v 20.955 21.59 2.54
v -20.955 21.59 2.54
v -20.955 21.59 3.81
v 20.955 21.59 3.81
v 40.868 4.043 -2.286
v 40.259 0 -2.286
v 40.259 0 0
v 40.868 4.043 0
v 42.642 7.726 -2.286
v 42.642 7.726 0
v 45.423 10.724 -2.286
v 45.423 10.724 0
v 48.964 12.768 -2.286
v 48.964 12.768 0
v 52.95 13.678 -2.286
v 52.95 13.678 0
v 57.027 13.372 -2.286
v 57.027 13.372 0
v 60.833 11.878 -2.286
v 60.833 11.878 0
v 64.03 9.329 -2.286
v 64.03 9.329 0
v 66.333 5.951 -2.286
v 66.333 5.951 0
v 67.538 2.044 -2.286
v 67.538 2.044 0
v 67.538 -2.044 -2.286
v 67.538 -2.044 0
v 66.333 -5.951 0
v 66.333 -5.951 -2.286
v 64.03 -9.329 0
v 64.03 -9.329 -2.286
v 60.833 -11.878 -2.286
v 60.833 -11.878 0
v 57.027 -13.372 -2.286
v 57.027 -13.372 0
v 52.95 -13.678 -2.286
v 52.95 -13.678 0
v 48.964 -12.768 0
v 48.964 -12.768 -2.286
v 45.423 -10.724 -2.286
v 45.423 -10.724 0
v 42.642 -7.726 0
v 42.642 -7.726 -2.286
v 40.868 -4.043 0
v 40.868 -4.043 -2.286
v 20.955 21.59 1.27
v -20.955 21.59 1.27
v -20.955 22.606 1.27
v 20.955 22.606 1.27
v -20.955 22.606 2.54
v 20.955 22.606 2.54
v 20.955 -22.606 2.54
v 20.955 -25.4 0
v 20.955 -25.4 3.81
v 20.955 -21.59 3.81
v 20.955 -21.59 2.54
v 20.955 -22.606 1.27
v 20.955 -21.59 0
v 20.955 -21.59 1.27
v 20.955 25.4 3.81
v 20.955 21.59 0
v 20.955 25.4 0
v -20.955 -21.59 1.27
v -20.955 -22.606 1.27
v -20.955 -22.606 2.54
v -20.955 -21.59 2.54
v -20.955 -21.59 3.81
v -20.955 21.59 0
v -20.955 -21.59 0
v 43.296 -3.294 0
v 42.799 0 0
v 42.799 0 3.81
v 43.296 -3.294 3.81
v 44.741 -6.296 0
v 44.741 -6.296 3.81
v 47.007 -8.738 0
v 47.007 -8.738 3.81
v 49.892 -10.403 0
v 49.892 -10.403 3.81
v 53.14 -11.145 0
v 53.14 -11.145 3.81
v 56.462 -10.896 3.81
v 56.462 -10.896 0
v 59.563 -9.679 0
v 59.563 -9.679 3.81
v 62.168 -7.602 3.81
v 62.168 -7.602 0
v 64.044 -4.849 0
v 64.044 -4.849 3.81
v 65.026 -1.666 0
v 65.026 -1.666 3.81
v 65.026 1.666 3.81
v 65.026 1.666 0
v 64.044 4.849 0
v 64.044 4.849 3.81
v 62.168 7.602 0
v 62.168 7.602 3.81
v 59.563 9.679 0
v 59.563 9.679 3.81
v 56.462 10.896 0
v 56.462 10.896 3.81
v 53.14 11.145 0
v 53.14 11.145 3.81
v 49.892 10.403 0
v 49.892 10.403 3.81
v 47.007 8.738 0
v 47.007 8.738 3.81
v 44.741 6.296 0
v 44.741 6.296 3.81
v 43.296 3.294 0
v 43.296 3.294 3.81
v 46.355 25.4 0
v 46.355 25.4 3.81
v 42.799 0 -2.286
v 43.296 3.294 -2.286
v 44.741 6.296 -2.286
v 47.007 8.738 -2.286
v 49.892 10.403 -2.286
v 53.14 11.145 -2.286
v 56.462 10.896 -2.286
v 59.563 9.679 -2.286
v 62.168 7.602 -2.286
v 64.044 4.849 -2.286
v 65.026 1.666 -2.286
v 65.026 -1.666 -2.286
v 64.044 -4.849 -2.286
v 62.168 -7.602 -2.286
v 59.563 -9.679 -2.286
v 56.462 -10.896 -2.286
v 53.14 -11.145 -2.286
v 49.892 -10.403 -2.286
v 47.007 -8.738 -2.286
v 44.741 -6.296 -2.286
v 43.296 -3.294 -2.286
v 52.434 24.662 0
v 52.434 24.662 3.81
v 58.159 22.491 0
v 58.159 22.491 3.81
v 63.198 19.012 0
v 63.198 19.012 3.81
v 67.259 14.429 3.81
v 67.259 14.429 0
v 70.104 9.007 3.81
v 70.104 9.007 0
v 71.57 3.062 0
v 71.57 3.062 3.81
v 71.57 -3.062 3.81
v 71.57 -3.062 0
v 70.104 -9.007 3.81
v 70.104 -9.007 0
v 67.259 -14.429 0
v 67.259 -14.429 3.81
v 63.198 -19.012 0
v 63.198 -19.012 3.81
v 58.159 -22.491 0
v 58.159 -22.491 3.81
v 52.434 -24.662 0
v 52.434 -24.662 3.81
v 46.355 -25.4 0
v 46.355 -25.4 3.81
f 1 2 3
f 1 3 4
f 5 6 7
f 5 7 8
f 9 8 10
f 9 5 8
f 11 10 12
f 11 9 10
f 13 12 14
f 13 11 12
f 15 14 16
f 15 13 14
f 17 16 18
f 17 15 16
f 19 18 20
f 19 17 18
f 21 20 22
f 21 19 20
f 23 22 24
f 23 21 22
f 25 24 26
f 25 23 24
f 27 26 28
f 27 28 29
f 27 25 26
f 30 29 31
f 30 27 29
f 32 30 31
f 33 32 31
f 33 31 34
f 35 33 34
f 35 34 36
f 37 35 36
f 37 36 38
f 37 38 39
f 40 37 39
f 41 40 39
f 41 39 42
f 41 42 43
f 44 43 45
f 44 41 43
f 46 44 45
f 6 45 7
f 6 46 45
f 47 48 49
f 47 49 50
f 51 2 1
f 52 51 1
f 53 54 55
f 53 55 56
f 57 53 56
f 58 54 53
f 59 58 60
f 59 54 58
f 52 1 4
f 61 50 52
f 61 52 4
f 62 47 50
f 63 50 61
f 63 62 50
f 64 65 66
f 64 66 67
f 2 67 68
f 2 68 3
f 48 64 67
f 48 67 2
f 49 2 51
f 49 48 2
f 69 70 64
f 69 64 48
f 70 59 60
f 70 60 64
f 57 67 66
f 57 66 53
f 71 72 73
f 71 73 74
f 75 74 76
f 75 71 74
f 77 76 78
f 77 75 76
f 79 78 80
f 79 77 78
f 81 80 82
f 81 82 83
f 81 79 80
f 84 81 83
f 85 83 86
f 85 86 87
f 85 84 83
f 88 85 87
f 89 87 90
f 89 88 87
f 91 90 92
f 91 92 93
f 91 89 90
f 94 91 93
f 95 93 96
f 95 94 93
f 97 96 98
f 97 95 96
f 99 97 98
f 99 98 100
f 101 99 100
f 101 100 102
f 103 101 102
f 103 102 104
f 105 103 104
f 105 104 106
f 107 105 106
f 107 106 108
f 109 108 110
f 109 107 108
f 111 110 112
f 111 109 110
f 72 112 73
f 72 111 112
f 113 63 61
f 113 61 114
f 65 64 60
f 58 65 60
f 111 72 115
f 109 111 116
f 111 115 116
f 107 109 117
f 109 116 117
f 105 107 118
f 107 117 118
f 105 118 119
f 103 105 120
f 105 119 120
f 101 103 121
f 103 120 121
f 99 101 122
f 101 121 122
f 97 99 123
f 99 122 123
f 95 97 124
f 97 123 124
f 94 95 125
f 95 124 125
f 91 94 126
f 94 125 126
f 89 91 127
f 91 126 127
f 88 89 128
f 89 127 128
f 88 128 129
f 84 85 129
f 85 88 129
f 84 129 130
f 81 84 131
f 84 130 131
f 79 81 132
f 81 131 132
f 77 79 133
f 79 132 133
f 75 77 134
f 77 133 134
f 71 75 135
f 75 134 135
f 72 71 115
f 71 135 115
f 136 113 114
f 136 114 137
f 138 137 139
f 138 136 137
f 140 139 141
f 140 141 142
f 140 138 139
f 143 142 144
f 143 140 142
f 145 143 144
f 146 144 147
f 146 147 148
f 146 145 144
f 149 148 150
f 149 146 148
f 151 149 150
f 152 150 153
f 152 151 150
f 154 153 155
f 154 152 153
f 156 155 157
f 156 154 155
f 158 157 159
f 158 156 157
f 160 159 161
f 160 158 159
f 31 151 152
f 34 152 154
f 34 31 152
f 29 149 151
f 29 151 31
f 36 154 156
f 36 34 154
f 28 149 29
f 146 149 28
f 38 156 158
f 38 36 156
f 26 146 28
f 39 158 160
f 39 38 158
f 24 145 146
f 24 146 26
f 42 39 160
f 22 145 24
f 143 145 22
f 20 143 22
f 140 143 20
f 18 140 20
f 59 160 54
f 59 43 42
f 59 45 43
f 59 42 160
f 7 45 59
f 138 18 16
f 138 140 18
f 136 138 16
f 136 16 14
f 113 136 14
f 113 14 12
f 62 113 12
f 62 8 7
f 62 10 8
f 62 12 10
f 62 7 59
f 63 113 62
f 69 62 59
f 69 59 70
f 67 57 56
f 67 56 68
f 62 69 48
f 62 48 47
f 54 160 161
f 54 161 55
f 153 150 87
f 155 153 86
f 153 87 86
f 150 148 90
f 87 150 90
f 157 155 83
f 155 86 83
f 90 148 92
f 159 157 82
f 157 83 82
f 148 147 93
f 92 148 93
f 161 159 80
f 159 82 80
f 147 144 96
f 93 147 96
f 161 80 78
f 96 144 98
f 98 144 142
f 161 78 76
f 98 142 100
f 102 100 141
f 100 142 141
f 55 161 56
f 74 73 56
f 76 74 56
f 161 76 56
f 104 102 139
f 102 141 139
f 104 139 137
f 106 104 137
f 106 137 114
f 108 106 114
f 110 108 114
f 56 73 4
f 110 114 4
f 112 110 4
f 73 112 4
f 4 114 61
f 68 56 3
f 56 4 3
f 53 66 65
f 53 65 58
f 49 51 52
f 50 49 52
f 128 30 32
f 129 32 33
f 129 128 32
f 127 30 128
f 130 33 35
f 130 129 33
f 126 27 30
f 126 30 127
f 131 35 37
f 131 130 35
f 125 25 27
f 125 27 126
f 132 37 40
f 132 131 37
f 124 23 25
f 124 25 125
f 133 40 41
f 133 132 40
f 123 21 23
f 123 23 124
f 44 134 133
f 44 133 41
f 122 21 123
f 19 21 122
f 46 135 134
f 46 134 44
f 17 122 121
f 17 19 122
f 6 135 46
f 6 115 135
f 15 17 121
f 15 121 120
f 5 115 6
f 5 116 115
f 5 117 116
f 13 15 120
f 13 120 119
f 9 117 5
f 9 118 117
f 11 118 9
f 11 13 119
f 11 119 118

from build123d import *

# Parameters (mm, degrees)
SKETCH1_R           = 11.176
BOSS_EXTRUDE1_DEPTH = 3.81
SKETCH2_W           = 41.91
SKETCH2_H           = 1.27
BOSS_EXTRUDE2_DEPTH = 1.016
BOSS_EXTRUDE4_START = 2.286
SKETCH4_R           = 13.716
SKETCH4_R_2         = 11.176
BOSS_EXTRUDE4_DEPTH = 2.286


with BuildPart() as part:
    # Sketch1 → Boss-Extrude1 (new body)
    with BuildSketch(Plane.XY):
        with BuildLine():
            Line((20.955, -25.4), (20.955, -21.59))
            Line((20.955, -21.59), (-20.955, -21.59))
            Line((-20.955, -21.59), (-20.955, 21.59))
            Line((-20.955, 21.59), (20.955, 21.59))
            Line((20.955, 21.59), (20.955, 25.4))
            Line((20.955, 25.4), (46.355, 25.4))
            ThreePointArc((46.355, 25.4), (71.755, 0), (46.355, -25.4))
            Line((46.355, -25.4), (20.955, -25.4))
        make_face()
        with Locations(Location((53.975, 0, 0), (0, 0, 180))):
            Circle(SKETCH1_R, mode=Mode.SUBTRACT)
    extrude(amount=BOSS_EXTRUDE1_DEPTH)

    # Sketch2 → Boss-Extrude2 (add)
    with BuildSketch(Plane.XZ.offset(21.59)):
        with Locations((0, 1.905)):
            Rectangle(SKETCH2_W, SKETCH2_H)
    boss_extrude2 = extrude(amount=BOSS_EXTRUDE2_DEPTH)

    # Mirror1: Boss-Extrude2 across plane
    add(boss_extrude2.mirror(Plane.ZX))

    # Sketch4 → Boss-Extrude4 (add)
    with BuildSketch(Plane(origin=(0, 0, 0), x_dir=(-1, 0, 0), z_dir=(0, 0, -1)).offset(BOSS_EXTRUDE4_START)):
        with Locations((-53.975, 0)):
            Circle(SKETCH4_R)
        with Locations((-53.975, 0)):
            Circle(SKETCH4_R_2, mode=Mode.SUBTRACT)
    extrude(amount=-BOSS_EXTRUDE4_DEPTH)


solid = part.part
